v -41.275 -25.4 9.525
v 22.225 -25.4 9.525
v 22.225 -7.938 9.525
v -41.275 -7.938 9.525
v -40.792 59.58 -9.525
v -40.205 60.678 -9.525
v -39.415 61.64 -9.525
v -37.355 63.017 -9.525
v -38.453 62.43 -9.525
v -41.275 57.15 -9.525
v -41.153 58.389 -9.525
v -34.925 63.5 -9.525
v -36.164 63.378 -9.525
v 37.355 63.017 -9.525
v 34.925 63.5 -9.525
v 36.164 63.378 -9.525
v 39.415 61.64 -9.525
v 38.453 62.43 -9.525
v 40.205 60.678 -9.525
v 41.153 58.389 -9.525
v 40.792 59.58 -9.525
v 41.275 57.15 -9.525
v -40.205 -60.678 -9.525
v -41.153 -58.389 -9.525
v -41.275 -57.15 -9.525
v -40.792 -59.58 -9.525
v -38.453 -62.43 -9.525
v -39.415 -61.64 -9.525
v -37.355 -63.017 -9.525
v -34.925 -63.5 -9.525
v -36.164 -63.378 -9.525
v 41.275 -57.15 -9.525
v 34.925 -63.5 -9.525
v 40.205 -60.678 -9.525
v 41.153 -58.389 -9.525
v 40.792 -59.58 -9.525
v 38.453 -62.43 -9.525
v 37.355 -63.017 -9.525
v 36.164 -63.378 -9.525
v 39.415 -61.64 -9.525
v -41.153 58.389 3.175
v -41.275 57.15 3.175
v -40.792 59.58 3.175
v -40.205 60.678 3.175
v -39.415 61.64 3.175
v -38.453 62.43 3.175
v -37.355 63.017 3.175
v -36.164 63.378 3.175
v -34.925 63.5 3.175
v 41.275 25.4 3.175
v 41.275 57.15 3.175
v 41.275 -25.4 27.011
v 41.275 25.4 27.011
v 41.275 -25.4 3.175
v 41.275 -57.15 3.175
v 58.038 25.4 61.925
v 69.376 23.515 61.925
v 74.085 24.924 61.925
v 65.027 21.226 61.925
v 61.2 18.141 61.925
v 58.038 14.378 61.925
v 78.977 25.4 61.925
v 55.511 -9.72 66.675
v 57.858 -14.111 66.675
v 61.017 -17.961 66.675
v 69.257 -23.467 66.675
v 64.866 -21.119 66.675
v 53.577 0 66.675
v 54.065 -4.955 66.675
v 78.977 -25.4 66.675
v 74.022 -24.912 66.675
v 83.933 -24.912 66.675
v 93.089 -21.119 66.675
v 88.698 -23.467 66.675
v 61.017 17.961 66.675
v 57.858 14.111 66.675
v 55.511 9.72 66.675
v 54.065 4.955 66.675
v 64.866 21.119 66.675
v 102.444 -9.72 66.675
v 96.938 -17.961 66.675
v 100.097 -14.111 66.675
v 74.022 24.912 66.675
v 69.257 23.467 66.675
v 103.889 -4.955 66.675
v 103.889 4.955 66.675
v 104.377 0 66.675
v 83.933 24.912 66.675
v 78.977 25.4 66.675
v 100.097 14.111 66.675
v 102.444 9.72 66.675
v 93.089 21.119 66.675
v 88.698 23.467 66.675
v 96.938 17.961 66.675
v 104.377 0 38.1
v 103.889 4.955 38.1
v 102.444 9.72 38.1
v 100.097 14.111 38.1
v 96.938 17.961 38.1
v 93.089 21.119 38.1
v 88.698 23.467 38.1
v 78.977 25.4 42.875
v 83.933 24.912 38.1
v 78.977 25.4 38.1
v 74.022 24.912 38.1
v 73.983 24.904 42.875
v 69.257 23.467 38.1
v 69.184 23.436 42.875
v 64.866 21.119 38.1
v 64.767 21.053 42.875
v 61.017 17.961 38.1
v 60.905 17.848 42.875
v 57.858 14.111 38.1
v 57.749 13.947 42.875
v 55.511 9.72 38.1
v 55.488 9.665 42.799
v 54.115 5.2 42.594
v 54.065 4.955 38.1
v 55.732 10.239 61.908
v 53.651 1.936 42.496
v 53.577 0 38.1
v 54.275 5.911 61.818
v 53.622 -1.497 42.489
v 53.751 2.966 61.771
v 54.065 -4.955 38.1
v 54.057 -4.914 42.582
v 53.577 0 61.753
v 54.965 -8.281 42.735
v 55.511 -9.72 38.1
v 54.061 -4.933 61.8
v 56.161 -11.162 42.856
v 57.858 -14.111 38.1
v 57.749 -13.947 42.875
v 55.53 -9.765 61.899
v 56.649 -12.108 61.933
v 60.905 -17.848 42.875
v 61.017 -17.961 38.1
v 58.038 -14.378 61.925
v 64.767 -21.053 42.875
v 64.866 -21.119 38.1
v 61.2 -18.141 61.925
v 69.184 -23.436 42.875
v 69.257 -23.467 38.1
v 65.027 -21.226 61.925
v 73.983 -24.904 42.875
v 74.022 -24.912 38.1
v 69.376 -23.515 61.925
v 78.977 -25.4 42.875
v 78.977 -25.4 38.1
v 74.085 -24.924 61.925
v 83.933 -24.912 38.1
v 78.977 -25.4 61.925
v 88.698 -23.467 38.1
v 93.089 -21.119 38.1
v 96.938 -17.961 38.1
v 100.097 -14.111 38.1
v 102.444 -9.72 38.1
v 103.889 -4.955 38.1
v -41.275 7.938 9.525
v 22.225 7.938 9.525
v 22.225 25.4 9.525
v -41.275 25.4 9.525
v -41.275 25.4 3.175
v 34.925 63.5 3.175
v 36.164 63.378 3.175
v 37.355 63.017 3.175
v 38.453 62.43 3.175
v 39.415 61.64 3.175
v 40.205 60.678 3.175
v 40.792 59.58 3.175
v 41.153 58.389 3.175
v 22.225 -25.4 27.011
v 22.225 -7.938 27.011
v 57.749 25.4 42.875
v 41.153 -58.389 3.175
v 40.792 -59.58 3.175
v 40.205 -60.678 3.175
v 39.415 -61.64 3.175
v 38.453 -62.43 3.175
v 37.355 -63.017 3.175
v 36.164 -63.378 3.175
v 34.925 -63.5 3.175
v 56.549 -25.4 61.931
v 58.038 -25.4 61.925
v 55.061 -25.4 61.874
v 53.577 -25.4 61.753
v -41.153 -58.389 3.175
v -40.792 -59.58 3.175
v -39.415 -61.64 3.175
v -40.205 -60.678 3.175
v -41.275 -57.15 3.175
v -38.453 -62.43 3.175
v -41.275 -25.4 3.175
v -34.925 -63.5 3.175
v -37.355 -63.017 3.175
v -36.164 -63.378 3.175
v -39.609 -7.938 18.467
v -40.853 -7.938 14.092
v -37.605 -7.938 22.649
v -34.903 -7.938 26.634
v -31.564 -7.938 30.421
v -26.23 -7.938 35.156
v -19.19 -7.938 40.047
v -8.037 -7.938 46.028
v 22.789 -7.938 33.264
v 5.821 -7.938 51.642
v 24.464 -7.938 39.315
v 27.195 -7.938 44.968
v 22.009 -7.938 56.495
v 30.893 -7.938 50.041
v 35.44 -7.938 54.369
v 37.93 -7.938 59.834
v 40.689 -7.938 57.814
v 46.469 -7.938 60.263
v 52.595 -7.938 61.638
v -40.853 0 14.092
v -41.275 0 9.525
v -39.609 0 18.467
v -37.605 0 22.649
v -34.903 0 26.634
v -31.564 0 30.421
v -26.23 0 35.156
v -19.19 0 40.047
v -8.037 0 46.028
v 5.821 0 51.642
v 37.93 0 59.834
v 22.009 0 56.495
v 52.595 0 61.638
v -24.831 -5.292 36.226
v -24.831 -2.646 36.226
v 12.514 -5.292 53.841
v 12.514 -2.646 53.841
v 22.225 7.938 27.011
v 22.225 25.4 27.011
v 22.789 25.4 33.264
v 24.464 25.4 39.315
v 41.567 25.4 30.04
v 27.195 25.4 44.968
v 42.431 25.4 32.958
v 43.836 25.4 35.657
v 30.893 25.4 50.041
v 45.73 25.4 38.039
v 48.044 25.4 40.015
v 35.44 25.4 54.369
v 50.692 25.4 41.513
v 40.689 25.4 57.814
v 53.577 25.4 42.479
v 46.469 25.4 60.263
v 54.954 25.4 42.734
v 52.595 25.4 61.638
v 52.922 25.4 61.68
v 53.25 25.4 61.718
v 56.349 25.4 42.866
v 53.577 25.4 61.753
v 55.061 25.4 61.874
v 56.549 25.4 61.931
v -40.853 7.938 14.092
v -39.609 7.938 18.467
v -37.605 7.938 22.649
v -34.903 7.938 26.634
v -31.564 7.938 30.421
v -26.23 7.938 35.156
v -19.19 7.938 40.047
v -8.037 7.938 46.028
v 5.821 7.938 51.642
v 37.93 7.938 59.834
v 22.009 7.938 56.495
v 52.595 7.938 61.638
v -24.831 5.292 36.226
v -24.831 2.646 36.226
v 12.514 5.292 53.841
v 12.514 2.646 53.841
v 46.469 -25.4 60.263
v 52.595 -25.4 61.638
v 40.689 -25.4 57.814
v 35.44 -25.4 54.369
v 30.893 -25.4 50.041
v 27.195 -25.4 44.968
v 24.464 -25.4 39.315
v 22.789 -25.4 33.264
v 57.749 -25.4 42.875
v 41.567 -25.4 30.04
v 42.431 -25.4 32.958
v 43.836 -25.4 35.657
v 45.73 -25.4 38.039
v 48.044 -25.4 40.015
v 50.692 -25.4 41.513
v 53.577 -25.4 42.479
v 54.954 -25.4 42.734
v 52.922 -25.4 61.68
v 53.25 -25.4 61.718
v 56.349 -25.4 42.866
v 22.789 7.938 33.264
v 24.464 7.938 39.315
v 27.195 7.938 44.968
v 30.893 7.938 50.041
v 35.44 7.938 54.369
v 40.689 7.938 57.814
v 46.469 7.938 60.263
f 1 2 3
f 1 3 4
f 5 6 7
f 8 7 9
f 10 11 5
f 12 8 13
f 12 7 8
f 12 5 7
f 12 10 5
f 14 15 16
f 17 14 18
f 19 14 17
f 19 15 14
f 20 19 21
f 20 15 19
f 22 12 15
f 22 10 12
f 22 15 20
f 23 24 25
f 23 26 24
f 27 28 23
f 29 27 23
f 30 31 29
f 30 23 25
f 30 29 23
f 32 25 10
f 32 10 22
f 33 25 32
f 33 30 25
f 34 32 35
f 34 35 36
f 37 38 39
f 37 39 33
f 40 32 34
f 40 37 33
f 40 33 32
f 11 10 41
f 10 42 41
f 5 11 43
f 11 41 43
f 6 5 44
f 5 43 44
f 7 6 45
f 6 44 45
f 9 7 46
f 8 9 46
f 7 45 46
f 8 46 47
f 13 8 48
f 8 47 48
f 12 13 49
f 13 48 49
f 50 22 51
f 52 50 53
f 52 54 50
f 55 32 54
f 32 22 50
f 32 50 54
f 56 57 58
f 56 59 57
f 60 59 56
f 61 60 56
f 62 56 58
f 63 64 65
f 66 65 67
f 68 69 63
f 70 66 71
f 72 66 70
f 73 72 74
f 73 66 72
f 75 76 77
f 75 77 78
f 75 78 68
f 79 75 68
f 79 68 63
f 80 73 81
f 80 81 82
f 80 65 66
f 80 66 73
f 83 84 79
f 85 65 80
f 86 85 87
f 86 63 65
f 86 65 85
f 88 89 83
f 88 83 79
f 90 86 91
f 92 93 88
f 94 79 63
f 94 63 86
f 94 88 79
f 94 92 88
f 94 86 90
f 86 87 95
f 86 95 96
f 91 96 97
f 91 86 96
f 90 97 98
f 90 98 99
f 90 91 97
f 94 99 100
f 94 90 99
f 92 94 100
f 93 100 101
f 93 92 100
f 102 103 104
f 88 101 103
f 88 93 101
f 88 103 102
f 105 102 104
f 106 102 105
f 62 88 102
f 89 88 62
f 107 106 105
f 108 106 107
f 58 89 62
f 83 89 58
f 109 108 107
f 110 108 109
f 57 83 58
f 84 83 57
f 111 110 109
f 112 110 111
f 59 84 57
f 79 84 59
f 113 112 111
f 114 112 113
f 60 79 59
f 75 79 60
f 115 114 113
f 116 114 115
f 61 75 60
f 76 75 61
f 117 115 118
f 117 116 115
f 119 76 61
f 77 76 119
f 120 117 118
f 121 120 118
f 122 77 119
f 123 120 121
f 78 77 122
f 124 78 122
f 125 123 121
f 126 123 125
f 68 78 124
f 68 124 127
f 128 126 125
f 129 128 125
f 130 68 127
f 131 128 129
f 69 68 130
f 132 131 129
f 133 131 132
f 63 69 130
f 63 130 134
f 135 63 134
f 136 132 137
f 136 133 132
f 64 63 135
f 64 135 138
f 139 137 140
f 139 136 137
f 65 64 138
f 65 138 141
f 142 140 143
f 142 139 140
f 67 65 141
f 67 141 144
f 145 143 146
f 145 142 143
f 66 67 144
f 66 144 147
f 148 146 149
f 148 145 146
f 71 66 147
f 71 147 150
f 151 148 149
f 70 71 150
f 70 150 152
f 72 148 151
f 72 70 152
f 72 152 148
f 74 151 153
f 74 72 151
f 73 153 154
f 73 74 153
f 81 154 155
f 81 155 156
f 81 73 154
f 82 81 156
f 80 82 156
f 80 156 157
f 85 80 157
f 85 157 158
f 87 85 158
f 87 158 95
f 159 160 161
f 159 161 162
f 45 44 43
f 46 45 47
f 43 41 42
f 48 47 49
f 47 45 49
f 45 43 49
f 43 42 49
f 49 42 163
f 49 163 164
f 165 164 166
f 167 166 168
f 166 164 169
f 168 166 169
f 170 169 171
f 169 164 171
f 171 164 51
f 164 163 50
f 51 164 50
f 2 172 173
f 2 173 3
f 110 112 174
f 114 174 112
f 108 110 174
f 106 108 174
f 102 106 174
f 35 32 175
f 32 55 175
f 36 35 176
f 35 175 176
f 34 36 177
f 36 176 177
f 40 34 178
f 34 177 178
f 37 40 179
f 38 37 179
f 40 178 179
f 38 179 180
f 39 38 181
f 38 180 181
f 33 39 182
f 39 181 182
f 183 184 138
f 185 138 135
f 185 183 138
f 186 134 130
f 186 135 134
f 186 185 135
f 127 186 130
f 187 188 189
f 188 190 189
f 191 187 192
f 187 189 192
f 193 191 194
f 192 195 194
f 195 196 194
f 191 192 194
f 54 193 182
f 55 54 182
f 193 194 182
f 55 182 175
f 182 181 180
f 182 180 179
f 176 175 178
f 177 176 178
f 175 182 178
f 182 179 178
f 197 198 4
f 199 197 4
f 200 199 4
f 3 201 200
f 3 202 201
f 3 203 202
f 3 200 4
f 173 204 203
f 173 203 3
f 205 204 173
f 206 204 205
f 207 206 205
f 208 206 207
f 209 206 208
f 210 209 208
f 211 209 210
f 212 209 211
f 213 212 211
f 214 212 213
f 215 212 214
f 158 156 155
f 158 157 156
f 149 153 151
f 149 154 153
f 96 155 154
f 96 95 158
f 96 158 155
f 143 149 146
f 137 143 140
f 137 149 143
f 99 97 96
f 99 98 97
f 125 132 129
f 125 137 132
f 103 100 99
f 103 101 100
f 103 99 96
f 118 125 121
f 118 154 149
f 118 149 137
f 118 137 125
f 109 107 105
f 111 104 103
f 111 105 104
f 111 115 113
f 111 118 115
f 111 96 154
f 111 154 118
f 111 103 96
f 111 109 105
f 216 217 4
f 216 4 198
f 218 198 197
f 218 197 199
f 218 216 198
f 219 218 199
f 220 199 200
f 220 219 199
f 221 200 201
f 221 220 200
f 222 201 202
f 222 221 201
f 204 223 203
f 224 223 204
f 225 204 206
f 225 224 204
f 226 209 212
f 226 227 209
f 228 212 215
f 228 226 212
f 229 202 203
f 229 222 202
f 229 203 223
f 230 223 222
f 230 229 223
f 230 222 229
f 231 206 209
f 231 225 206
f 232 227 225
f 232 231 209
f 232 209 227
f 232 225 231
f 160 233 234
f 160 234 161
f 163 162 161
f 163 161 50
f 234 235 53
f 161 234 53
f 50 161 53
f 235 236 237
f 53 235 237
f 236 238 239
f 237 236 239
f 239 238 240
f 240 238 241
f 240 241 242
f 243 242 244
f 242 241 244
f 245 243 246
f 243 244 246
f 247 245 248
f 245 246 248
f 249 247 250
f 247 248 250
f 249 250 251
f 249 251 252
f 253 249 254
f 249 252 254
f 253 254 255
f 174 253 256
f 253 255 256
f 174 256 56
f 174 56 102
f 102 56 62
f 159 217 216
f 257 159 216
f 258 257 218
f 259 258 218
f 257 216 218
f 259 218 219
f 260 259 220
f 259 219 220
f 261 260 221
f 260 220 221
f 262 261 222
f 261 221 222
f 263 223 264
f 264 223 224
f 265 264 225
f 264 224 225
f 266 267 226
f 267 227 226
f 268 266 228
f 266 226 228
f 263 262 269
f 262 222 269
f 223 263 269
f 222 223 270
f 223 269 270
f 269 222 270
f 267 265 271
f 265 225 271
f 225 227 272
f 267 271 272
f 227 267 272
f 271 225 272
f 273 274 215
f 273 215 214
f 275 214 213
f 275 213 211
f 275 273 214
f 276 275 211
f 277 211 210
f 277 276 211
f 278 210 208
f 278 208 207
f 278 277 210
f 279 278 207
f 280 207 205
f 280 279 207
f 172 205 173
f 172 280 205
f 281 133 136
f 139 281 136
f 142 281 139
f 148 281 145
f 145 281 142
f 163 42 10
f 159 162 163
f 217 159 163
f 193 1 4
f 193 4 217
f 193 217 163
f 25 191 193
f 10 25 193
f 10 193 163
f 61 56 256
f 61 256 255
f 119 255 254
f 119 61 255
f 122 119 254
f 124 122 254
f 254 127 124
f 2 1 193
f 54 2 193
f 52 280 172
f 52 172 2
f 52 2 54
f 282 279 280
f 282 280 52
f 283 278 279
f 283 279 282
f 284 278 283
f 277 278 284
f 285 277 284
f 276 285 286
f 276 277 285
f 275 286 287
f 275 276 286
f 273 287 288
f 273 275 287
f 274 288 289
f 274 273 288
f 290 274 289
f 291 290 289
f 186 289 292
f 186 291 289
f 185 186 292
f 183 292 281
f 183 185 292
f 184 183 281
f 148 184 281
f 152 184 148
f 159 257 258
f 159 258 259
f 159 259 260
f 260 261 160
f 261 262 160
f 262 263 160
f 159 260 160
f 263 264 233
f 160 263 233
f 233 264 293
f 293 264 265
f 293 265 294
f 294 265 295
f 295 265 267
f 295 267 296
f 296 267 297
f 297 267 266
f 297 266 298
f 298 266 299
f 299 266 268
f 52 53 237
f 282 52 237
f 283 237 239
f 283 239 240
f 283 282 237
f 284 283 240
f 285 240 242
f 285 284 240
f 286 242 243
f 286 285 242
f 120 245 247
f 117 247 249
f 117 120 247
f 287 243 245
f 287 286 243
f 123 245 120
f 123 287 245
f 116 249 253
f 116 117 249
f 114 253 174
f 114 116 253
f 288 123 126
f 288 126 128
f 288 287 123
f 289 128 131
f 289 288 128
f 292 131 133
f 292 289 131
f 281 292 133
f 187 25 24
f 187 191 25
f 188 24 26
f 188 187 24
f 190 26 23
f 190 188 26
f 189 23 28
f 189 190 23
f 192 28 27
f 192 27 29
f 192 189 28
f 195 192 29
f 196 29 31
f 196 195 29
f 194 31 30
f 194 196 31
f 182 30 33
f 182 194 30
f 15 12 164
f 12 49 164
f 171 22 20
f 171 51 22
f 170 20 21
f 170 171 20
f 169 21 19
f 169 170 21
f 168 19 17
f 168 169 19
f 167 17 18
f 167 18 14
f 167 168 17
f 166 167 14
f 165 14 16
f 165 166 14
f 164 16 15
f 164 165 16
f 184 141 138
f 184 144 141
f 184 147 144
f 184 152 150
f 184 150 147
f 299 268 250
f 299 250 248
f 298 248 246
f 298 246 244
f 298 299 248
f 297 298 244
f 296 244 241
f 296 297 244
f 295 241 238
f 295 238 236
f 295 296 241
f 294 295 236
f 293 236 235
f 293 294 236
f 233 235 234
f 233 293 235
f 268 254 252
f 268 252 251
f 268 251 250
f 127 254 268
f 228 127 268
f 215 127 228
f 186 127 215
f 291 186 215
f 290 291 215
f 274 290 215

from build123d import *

# Parameters (mm, degrees)
F0_W     = 82.55
F0_H     = 12.7
F1_DEPTH = 63.5
F2_DEPTH = 25.4
F3_DEPTH = 7.9375
F5_R     = 6.35


with BuildPart() as f1:
    # F0 (on Front) → F1 (new body, symmetric)
    with BuildSketch(Plane.XZ):
        with Locations((0, -3.175)):
            Rectangle(F0_W, F0_H)
    extrude(amount=F1_DEPTH, both=True)

    # F0 (on Front) → F2 (join, symmetric)
    with BuildSketch(Plane.XZ):
        with Locations((0, -3.175)):
            Rectangle(F0_W, F0_H)
        with BuildLine():
            ThreePointArc((53.577404361, 61.7532924078), (53.0857792806, 61.6992166922), (52.5949692711, 61.6381844286))
            add(Edge.make_bspline(
                [(52.5949692711, 61.6381844286), (52.9244758312, 61.6627898631), (53.2519761831, 61.6860233314), (53.577404361, 61.7078821692)],
                knots=[106.6137732969, 106.6137732969, 106.6137732969, 106.6137732969, 107.6063471029, 107.6063471029, 107.6063471029, 107.6063471029], degree=3))
            Line((53.577404361, 61.7078821692), (53.577404361, 61.7532924078))
        make_face()
        Polygon((22.225, 9.525), (-41.275, 9.525), (-41.275, 3.175), (41.275, 3.175), (41.275, 9.525), align=None)
        with BuildLine():
            ThreePointArc((58.0383306755, 61.9252), (55.8051179778, 61.9105955677), (53.577404361, 61.7532924078))
            Line((53.577404361, 61.7532924078), (53.577404361, 61.7078821692))
            add(Edge.make_bspline(
                [(53.577404361, 61.7078821692), (55.1128174226, 61.8110150488), (56.602102301, 61.8835475984), (58.0383306755, 61.9252)],
                knots=[107.6063471029, 107.6063471029, 107.6063471029, 107.6063471029, 112.2894412218, 112.2894412218, 112.2894412218, 112.2894412218], degree=3))
        make_face()
        with BuildLine():
            Line((22.225, 27.0114993424), (22.225, 9.525))
            Line((22.225, 9.525), (41.275, 9.525))
            Line((41.275, 9.525), (41.275, 27.0114993424))
            ThreePointArc((41.275, 27.0114993424), (44.7256171025, 36.8933177284), (53.577404361, 42.4792782844))
            Line((53.577404361, 42.4792782844), (53.577404361, 61.7078821692))
            add(Edge.make_bspline(
                [(52.5949692711, 61.6381844286), (52.9244758312, 61.6627898631), (53.2519761831, 61.6860233314), (53.577404361, 61.7078821692)],
                knots=[106.6137732969, 106.6137732969, 106.6137732969, 106.6137732969, 107.6063471029, 107.6063471029, 107.6063471029, 107.6063471029], degree=3))
            ThreePointArc((52.5949692711, 61.6381844286), (30.8931906622, 50.0405155696), (22.225, 27.0114993424))
        make_face()
        with BuildLine():
            add(Edge.make_bspline(
                [(53.577404361, 61.7078821692), (55.1128174226, 61.8110150488), (56.602102301, 61.8835475984), (58.0383306755, 61.9252)],
                knots=[107.6063471029, 107.6063471029, 107.6063471029, 107.6063471029, 112.2894412218, 112.2894412218, 112.2894412218, 112.2894412218], degree=3))
            Line((53.577404361, 61.7078821692), (53.577404361, 42.4792782844))
            ThreePointArc((53.577404361, 42.4792782844), (55.6500090256, 42.8154751737), (57.7488542769, 42.8752))
            Line((57.7488542769, 42.8752), (78.977404361, 42.8752))
            Line((78.977404361, 42.8752), (78.977404361, 61.9252))
            Line((78.977404361, 61.9252), (58.0383306755, 61.9252))
        make_face()
    extrude(amount=F2_DEPTH, both=True)

    # F0 (on Front) → F3 (join, symmetric)
    with BuildSketch(Plane.XZ):
        with Locations((0, -3.175)):
            Rectangle(F0_W, F0_H)
        with BuildLine():
            add(Edge.make_bspline(
                [(-41.275, 9.525), (-41.3366305688, 40.5237040654), (17.2021979841, 58.9952794856), (52.5949692711, 61.6381844286)],
                knots=[0, 0, 0, 0, 106.6137732969, 106.6137732969, 106.6137732969, 106.6137732969], degree=3))
            Line((-41.275, 9.525), (22.225, 9.525))
            Line((22.225, 9.525), (22.225, 27.0114993424))
            ThreePointArc((22.225, 27.0114993424), (30.8931906622, 50.0405155696), (52.5949692711, 61.6381844286))
        make_face()
        with BuildLine():
            ThreePointArc((53.577404361, 61.7532924078), (53.0857792806, 61.6992166922), (52.5949692711, 61.6381844286))
            add(Edge.make_bspline(
                [(52.5949692711, 61.6381844286), (52.9244758312, 61.6627898631), (53.2519761831, 61.6860233314), (53.577404361, 61.7078821692)],
                knots=[106.6137732969, 106.6137732969, 106.6137732969, 106.6137732969, 107.6063471029, 107.6063471029, 107.6063471029, 107.6063471029], degree=3))
            Line((53.577404361, 61.7078821692), (53.577404361, 61.7532924078))
        make_face()
        Polygon((22.225, 9.525), (-41.275, 9.525), (-41.275, 3.175), (41.275, 3.175), (41.275, 9.525), align=None)
        with BuildLine():
            ThreePointArc((58.0383306755, 61.9252), (55.8051179778, 61.9105955677), (53.577404361, 61.7532924078))
            Line((53.577404361, 61.7532924078), (53.577404361, 61.7078821692))
            add(Edge.make_bspline(
                [(53.577404361, 61.7078821692), (55.1128174226, 61.8110150488), (56.602102301, 61.8835475984), (58.0383306755, 61.9252)],
                knots=[107.6063471029, 107.6063471029, 107.6063471029, 107.6063471029, 112.2894412218, 112.2894412218, 112.2894412218, 112.2894412218], degree=3))
        make_face()
        with BuildLine():
            Line((22.225, 27.0114993424), (22.225, 9.525))
            Line((22.225, 9.525), (41.275, 9.525))
            Line((41.275, 9.525), (41.275, 27.0114993424))
            ThreePointArc((41.275, 27.0114993424), (44.7256171025, 36.8933177284), (53.577404361, 42.4792782844))
            Line((53.577404361, 42.4792782844), (53.577404361, 61.7078821692))
            add(Edge.make_bspline(
                [(52.5949692711, 61.6381844286), (52.9244758312, 61.6627898631), (53.2519761831, 61.6860233314), (53.577404361, 61.7078821692)],
                knots=[106.6137732969, 106.6137732969, 106.6137732969, 106.6137732969, 107.6063471029, 107.6063471029, 107.6063471029, 107.6063471029], degree=3))
            ThreePointArc((52.5949692711, 61.6381844286), (30.8931906622, 50.0405155696), (22.225, 27.0114993424))
        make_face()
        with BuildLine():
            add(Edge.make_bspline(
                [(53.577404361, 61.7078821692), (55.1128174226, 61.8110150488), (56.602102301, 61.8835475984), (58.0383306755, 61.9252)],
                knots=[107.6063471029, 107.6063471029, 107.6063471029, 107.6063471029, 112.2894412218, 112.2894412218, 112.2894412218, 112.2894412218], degree=3))
            Line((53.577404361, 61.7078821692), (53.577404361, 42.4792782844))
            ThreePointArc((53.577404361, 42.4792782844), (55.6500090256, 42.8154751737), (57.7488542769, 42.8752))
            Line((57.7488542769, 42.8752), (78.977404361, 42.8752))
            Line((78.977404361, 42.8752), (78.977404361, 61.9252))
            Line((78.977404361, 61.9252), (58.0383306755, 61.9252))
        make_face()
    extrude(amount=F3_DEPTH, both=True)

    # F0 (on Front) → F4 (revolve)
    with BuildSketch(Plane.XZ):
        Polygon((104.377404361, 66.675), (78.977404361, 66.675), (78.977404361, 61.9252), (78.977404361, 42.8752), (78.977404361, 38.1), (104.377404361, 38.1), align=None)
    revolve(axis=Axis((78.977404361, 0, 52.3875), (0, 0, 1)))

    # F5
    f5_edges = [f1.edges().sort_by_distance(p)[0] for p in [
        (41.275, -63.5, -3.175),
        (-41.275, -63.5, -3.175),
        (41.275, 63.5, -3.175),
        (-41.275, 63.5, -3.175),
    ]]
    fillet(f5_edges, radius=F5_R)


solid = f1.part
